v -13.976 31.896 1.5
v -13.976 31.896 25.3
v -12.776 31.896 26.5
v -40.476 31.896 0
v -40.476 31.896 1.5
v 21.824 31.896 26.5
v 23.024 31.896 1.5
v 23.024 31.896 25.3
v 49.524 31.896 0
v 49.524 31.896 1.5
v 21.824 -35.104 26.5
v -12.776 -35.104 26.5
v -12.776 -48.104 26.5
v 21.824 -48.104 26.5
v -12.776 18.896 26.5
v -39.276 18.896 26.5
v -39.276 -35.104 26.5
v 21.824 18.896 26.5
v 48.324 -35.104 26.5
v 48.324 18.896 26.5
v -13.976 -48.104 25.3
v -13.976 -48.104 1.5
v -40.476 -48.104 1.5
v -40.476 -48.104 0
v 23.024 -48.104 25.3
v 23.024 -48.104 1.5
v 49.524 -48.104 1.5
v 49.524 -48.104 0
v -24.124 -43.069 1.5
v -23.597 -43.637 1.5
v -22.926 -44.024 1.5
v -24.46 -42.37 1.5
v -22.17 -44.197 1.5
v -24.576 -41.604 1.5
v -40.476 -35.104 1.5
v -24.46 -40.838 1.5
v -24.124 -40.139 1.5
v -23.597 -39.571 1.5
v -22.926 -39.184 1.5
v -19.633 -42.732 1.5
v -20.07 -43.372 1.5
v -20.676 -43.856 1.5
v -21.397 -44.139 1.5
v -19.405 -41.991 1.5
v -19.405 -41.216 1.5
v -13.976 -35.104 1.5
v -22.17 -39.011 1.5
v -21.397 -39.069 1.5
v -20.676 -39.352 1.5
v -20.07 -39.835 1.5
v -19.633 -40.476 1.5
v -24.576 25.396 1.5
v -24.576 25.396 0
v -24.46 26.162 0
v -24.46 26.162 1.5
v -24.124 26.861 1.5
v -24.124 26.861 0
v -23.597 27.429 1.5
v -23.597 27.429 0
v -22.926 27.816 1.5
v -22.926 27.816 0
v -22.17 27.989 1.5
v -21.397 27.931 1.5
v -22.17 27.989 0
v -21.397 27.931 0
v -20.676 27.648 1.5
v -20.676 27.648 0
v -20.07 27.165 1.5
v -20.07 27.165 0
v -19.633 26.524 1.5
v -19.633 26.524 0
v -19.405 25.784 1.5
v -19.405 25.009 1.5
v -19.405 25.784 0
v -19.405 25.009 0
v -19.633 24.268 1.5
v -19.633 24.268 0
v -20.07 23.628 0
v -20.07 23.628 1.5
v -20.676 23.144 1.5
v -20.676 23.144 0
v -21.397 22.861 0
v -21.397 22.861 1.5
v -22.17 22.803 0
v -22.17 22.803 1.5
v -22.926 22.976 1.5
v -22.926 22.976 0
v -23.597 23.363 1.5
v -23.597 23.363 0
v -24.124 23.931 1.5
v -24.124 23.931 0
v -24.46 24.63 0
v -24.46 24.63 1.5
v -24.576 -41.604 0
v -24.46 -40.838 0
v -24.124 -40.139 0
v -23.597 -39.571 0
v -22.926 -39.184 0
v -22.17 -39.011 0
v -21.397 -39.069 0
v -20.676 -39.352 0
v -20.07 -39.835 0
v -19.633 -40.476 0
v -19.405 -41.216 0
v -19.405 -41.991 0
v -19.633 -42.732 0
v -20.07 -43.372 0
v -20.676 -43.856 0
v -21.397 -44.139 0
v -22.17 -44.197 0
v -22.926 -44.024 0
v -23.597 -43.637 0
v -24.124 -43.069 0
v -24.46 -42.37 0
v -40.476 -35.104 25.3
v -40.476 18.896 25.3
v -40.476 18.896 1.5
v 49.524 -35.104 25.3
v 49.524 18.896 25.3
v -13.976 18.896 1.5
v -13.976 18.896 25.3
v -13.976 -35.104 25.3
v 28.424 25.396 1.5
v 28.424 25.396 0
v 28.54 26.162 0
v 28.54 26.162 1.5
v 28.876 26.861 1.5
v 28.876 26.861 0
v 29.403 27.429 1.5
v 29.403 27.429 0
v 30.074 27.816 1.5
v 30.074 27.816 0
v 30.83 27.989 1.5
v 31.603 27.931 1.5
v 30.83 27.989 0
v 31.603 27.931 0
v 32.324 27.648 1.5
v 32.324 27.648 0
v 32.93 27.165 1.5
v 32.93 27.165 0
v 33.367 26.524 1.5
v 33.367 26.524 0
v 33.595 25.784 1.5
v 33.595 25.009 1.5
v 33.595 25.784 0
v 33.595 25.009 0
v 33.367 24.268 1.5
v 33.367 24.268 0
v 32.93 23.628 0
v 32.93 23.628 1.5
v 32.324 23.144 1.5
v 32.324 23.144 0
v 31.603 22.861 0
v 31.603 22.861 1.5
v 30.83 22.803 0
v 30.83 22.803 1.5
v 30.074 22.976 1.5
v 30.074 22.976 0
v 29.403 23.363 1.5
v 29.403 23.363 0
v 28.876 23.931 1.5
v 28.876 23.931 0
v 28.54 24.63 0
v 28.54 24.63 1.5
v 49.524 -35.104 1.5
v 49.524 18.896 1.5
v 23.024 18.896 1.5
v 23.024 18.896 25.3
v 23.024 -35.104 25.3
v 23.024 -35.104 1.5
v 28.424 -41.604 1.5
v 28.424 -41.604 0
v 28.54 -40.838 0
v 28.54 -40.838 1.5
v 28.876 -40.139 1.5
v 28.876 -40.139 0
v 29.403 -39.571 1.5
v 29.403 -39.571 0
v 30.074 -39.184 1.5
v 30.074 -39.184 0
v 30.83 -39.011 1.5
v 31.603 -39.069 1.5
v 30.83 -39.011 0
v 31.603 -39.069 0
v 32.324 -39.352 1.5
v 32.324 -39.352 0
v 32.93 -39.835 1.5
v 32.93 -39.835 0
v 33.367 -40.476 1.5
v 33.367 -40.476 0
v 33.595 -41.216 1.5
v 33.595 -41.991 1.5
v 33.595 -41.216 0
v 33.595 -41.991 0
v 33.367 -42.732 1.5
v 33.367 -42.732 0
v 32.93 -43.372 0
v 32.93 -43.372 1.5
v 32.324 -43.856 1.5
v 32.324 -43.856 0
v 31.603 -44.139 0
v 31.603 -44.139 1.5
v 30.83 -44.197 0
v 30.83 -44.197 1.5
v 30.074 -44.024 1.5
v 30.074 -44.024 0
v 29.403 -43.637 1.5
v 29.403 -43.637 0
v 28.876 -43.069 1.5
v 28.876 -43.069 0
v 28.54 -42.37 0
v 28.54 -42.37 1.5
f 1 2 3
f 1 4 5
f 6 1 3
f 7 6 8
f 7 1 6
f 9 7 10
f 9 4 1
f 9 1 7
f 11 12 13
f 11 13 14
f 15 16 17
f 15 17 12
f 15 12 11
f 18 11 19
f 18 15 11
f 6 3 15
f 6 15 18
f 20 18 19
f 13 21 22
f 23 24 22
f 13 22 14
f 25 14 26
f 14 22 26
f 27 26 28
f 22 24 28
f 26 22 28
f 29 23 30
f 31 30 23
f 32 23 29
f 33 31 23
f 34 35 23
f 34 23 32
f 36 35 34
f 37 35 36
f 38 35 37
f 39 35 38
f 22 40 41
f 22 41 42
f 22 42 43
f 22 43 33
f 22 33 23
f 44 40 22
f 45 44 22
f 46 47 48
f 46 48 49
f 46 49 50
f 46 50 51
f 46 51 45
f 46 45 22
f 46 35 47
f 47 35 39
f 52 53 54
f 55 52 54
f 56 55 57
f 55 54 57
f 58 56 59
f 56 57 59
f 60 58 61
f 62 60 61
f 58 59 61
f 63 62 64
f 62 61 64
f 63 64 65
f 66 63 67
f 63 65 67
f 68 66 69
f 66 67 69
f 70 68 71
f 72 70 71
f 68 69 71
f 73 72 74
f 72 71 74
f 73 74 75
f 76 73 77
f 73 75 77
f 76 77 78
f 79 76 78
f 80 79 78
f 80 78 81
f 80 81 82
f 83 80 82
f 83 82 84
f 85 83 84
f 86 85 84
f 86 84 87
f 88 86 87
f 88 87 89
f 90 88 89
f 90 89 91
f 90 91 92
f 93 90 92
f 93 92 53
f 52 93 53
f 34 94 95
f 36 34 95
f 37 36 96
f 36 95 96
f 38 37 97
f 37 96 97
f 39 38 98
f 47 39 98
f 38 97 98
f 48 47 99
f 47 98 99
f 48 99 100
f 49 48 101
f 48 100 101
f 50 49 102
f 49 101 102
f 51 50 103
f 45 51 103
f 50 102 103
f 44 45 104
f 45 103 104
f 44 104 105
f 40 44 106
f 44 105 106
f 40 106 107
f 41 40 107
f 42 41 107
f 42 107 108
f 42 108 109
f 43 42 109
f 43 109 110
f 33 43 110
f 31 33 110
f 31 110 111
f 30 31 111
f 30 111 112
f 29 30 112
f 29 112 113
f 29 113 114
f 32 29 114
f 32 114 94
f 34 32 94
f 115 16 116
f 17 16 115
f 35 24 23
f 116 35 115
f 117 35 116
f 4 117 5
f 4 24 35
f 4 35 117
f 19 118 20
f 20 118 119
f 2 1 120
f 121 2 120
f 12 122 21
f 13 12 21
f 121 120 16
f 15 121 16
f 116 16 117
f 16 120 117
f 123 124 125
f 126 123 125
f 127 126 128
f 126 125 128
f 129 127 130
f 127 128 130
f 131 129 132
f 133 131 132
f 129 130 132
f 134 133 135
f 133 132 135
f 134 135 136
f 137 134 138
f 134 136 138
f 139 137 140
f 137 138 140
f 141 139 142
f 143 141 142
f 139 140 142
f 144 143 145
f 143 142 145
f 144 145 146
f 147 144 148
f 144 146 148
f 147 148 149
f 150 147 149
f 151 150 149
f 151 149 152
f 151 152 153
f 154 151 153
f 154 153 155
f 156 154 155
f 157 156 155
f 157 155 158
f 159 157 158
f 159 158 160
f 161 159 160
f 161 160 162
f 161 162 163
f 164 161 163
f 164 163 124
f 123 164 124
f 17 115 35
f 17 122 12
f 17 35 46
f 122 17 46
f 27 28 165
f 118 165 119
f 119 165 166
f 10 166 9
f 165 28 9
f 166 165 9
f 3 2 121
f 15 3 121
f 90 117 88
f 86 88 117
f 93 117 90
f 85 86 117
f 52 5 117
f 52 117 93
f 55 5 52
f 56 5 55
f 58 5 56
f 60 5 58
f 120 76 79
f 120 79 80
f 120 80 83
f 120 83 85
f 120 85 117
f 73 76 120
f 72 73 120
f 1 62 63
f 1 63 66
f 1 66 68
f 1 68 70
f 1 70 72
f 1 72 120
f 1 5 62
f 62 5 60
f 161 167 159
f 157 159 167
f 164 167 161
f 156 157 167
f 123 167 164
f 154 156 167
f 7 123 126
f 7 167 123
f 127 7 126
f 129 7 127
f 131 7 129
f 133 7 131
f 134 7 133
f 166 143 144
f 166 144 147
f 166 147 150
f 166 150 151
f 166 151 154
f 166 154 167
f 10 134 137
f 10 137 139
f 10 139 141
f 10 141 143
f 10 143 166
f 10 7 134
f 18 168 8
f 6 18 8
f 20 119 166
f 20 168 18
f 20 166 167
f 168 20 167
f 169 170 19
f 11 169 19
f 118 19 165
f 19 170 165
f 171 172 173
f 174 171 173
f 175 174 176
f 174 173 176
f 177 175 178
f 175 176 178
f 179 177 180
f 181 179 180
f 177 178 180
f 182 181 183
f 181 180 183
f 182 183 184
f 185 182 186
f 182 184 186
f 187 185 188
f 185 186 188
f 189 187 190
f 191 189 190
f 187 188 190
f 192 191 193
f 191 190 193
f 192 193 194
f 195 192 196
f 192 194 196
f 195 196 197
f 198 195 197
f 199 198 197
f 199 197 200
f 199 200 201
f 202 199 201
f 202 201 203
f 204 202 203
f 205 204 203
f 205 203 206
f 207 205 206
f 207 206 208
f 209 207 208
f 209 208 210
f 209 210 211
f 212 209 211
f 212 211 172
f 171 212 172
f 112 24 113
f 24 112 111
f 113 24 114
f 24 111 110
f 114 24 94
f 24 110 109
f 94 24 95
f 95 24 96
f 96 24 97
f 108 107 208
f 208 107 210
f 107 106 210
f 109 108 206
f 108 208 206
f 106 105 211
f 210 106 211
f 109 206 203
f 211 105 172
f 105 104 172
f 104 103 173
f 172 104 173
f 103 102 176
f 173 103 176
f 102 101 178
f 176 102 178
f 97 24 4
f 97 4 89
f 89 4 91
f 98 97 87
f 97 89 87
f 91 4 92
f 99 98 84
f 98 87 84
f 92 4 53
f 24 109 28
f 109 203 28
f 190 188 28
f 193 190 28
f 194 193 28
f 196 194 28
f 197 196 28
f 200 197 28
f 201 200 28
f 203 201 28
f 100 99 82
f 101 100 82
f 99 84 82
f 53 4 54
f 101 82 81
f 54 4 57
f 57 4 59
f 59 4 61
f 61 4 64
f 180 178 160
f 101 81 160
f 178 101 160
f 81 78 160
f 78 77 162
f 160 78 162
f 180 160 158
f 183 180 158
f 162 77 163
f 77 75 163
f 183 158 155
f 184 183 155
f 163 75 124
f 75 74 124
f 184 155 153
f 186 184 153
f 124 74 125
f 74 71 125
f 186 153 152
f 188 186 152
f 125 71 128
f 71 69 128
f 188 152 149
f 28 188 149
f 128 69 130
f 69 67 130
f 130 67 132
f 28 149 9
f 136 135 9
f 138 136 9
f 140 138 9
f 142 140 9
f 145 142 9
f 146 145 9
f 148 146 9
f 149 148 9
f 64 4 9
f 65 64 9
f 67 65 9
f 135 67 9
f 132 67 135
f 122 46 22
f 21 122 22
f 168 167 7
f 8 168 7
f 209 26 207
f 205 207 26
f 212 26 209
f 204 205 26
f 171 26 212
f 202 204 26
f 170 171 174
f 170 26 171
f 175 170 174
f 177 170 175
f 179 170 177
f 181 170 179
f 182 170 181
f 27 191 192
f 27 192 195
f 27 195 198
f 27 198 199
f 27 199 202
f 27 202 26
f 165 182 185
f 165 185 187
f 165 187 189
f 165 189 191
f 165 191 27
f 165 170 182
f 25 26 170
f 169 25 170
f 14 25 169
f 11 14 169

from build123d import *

# Parameters (mm, degrees)
F0_W     = 90
F0_H     = 80
F1_DEPTH = 1.5
F3_DEPTH = 25
F4_D     = 5.2
F4_DEPTH = 5
F4_TIP   = 1.5622376095
F5_SIZE  = 1.2


with BuildPart() as f1:
    # F0 (on Top) → F1 (new body)
    with BuildSketch(Plane.XY):
        with Locations((4.5240691602, -8.1039099395)):
            Rectangle(F0_W, F0_H)
    extrude(amount=F1_DEPTH)

    # F2 (on face) → F3 (join)
    with BuildSketch(Plane.XY.offset(1.5)):
        Polygon((0, 31.8960900605), (-13.9759308398, 31.8960900605), (-13.9759308398, 18.8960900605), (-40.4759308398, 18.8960900605), (-40.4759308398, -35.1039099395), (-13.9759308398, -35.1039099395), (-13.9759308398, -48.1039099395), (23.0240691602, -48.1039099395), (23.0240691602, -35.1039099395), (49.5240691602, -35.1039099395), (49.5240691602, 18.8960900605), (23.0240691602, 18.8960900605), (23.0240691602, 31.8960900605), align=None)
    extrude(amount=F3_DEPTH)

    # F4
    with Locations(Plane.XY.offset(1.5)):
        with Locations((-21.9759307802, 25.3960900605), (31.0240691602, 25.3960900605), (31.0240691602, -41.6039099395), (-21.9759307802, -41.6039099395)):
            Hole(F4_D / 2, depth=F4_DEPTH)
            with Locations((0, 0, -(F4_DEPTH + F4_TIP / 2))):  # 118° drill point
                Cone(0, F4_D / 2, F4_TIP, mode=Mode.SUBTRACT)

    # F5
    f5_edges = [f1.edges().sort_by_distance(p)[0] for p in [
        (-40.475931, -8.10391, 26.5),
        (-13.975931, -41.60391, 26.5),
        (-13.975931, 25.39609, 26.5),
        (23.024069, 25.39609, 26.5),
        (23.024069, -41.60391, 26.5),
        (49.524069, -8.10391, 26.5),
    ]]
    chamfer(f5_edges, length=F5_SIZE)


solid = f1.part
